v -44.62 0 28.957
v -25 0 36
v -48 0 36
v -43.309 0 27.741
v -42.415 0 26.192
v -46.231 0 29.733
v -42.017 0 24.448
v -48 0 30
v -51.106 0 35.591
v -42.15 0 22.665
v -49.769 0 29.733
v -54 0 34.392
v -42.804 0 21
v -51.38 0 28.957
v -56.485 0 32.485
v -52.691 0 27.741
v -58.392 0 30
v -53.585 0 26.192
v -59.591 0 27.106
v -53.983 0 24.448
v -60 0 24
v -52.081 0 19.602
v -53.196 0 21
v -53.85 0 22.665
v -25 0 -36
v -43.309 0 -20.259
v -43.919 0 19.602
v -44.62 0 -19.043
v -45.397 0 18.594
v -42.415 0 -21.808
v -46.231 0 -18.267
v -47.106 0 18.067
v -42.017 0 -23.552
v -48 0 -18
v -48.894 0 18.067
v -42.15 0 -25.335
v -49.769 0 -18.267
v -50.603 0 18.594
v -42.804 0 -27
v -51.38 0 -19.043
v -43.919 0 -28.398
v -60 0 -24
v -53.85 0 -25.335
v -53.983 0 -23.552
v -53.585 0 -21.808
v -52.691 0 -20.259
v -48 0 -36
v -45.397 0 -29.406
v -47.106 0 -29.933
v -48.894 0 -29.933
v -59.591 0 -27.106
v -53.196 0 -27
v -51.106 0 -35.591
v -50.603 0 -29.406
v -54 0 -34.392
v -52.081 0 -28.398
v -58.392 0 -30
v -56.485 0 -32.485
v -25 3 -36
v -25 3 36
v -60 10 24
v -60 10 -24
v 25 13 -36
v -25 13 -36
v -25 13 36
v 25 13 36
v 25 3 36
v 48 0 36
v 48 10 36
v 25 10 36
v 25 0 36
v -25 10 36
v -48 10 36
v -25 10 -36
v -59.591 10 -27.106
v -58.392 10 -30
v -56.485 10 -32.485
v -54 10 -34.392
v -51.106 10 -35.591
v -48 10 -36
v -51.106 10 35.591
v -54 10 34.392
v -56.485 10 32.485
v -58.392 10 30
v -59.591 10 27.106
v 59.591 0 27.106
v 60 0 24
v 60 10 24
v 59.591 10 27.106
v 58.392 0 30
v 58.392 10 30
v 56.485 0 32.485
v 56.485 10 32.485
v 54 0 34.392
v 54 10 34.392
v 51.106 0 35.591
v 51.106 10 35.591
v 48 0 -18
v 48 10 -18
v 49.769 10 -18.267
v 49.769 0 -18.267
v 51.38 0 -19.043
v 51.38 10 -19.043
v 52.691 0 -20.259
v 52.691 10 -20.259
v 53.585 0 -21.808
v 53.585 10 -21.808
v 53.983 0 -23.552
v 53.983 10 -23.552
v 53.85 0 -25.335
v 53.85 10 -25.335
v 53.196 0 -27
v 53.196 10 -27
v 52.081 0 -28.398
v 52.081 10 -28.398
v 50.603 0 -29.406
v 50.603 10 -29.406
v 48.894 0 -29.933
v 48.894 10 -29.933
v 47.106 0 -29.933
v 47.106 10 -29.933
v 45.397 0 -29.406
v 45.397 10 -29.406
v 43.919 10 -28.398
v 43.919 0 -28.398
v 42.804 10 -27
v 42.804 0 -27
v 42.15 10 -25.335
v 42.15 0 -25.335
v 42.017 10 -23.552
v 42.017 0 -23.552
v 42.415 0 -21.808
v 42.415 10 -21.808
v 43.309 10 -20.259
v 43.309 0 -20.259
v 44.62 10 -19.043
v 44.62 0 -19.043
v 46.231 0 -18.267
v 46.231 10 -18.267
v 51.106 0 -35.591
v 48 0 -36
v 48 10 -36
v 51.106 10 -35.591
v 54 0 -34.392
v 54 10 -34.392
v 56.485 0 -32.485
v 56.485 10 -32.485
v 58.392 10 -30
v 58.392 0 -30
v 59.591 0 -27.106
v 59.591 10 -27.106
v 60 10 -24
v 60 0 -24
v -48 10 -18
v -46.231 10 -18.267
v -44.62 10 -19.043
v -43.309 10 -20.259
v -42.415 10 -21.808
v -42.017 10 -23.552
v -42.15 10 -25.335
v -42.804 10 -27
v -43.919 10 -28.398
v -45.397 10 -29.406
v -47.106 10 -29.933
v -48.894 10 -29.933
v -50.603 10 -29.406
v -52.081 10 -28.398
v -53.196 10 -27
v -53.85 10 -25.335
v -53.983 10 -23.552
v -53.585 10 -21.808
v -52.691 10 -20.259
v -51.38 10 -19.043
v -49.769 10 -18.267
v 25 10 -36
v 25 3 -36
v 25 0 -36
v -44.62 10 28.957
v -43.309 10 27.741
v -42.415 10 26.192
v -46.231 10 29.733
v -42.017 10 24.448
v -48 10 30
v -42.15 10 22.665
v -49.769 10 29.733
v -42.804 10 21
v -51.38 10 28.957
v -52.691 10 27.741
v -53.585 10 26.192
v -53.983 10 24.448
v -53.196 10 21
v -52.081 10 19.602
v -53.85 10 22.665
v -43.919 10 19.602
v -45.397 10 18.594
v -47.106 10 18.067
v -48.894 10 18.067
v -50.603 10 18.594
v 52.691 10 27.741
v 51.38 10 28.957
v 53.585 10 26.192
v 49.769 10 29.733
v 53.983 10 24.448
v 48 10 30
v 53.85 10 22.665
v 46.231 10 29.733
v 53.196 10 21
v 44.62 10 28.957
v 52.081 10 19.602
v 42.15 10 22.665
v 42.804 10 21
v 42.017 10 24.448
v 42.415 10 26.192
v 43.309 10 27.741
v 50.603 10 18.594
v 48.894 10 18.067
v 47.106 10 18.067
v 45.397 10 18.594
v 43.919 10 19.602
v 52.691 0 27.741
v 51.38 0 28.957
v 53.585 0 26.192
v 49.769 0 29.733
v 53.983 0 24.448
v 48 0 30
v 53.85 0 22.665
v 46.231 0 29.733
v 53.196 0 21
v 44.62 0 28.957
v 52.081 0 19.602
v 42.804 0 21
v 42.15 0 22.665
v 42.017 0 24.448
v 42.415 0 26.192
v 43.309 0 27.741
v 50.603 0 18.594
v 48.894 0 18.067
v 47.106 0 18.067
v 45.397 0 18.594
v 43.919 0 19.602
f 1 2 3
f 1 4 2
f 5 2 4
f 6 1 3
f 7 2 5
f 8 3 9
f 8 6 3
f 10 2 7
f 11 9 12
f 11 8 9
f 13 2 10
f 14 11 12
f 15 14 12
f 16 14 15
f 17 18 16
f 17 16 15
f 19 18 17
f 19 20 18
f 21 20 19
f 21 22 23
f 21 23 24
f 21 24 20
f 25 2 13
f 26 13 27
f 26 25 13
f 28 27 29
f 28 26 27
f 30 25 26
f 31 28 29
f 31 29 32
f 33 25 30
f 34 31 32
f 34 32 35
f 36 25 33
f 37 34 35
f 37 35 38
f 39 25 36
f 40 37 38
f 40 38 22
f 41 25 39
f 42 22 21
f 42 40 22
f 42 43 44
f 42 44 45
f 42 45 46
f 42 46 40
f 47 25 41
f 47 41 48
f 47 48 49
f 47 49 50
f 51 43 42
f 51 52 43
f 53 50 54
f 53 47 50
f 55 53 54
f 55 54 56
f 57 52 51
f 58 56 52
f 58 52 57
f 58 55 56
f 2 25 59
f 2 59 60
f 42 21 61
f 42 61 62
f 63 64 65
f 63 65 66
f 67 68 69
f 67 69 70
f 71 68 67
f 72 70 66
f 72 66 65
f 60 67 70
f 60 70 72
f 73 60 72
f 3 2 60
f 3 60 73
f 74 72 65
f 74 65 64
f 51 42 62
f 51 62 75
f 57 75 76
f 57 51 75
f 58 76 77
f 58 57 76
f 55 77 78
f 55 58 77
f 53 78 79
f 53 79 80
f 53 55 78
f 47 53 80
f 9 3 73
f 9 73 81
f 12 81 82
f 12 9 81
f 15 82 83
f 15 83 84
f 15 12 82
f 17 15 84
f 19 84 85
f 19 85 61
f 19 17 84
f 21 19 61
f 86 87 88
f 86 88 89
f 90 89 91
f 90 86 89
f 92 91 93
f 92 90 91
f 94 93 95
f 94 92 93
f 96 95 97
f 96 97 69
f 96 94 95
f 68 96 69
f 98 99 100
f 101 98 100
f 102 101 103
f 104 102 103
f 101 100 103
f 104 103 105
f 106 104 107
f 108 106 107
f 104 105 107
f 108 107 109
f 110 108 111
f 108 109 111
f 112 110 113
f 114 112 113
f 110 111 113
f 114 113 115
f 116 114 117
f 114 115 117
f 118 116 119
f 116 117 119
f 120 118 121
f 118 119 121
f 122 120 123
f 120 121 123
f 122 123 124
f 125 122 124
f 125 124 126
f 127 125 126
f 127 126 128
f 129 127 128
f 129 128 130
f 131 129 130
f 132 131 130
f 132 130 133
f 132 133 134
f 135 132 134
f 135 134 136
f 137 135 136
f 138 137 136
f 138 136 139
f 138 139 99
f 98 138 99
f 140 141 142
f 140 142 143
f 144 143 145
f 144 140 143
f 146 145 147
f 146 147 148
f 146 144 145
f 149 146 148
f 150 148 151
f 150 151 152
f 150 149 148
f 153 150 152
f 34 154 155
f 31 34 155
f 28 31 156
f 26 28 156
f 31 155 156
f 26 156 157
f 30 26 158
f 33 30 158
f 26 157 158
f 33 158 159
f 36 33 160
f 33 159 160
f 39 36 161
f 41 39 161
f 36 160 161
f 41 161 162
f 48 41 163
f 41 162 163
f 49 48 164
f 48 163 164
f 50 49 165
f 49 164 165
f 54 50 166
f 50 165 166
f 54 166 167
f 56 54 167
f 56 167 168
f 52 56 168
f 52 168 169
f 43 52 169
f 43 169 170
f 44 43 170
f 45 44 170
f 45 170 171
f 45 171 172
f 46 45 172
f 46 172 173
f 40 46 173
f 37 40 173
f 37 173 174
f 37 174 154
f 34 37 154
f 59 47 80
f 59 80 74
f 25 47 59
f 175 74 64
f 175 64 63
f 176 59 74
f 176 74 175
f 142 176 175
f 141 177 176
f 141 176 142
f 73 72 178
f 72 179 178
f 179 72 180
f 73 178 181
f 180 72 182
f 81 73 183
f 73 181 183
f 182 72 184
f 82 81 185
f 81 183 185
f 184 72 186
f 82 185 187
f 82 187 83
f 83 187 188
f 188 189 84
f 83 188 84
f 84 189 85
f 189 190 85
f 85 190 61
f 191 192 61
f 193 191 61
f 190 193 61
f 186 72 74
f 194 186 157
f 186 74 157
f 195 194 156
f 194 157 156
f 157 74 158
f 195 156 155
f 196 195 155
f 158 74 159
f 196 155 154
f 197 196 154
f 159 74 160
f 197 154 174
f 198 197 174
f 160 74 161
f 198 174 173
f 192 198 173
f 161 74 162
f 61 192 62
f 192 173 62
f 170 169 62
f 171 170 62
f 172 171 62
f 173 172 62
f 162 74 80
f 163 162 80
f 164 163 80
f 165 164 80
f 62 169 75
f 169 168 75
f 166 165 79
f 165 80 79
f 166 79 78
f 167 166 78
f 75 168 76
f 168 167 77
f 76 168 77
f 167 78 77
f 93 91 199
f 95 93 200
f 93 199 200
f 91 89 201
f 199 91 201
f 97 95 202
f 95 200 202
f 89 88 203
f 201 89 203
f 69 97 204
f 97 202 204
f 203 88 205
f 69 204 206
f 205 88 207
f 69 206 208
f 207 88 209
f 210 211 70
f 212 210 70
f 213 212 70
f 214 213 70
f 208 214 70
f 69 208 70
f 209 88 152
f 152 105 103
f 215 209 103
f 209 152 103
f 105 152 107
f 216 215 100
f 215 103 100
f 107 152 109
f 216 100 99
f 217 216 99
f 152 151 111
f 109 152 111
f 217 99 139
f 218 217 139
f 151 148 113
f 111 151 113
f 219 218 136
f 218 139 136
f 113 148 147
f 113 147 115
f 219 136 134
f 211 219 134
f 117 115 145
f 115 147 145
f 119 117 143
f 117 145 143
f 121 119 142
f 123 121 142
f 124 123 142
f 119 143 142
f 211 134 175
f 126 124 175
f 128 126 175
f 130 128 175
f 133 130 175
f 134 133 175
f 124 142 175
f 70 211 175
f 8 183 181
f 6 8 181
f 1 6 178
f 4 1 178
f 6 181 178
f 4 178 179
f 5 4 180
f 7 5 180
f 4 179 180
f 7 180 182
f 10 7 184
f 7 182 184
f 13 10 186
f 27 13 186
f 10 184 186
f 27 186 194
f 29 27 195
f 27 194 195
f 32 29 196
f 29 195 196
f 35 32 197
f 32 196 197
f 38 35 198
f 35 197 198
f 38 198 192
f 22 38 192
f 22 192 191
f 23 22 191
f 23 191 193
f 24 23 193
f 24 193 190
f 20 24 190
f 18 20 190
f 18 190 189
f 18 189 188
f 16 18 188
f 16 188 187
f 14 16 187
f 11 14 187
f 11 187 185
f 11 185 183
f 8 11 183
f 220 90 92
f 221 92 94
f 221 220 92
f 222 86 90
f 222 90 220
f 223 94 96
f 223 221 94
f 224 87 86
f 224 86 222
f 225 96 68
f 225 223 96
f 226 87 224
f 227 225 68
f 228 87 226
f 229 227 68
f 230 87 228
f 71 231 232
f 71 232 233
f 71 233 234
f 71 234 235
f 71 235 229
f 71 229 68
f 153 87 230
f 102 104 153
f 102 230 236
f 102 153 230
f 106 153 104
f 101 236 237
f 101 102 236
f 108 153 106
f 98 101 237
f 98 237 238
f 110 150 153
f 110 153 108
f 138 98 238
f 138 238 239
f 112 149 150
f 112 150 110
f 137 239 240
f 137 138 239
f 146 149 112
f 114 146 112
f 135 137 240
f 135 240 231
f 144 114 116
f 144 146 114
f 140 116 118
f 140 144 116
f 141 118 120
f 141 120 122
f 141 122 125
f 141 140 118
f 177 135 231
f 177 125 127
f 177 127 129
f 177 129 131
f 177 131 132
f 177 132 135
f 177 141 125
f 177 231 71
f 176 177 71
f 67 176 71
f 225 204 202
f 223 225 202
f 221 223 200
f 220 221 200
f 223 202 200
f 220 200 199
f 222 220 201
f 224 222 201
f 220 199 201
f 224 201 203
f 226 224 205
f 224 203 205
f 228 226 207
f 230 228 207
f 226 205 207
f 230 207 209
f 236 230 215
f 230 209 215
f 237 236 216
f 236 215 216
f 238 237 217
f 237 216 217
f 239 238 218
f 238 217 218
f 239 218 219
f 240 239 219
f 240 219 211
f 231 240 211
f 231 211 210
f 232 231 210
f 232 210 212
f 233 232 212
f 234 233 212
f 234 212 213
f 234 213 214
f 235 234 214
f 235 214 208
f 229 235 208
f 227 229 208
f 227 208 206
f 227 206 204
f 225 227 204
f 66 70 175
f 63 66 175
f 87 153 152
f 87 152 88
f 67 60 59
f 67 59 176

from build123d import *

# Parameters (mm, degrees)
BOSS_EXTRUDE1_DEPTH = 10
SKETCH2_W           = 50
SKETCH2_H           = 72
BOSS_EXTRUDE2_DEPTH = 3
SKETCH3_W           = 50
SKETCH3_H           = 72
CUT_EXTRUDE1_DEPTH  = 3
SKETCH4_R           = 6
CUT_EXTRUDE3_DEPTH  = 49


with BuildPart() as part:
    # Sketch1 → Boss-Extrude1 (new body)
    with BuildSketch(Plane(origin=(0, 0, 0), x_dir=(1, 0, 0), z_dir=(0, 1, 0))):
        with BuildLine():
            Line((-48, 36), (48, 36))
            ThreePointArc((48, 36), (56.485281374, 32.485281374), (60, 24))
            Line((60, 24), (60, -24))
            ThreePointArc((60, -24), (56.485281374, -32.485281374), (48, -36))
            Line((48, -36), (-48, -36))
            ThreePointArc((-48, -36), (-56.485281374, -32.485281374), (-60, -24))
            Line((-60, -24), (-60, 24))
            ThreePointArc((-60, 24), (-56.485281374, 32.485281374), (-48, 36))
        make_face()
    extrude(amount=BOSS_EXTRUDE1_DEPTH)

    # Sketch2 → Boss-Extrude2 (add)
    with BuildSketch(Plane(origin=(0, 10, 0), x_dir=(1, 0, 0), z_dir=(0, 1, 0))):
        Rectangle(SKETCH2_W, SKETCH2_H)
    extrude(amount=BOSS_EXTRUDE2_DEPTH)

    # Sketch3 → Cut-Extrude1 (cut)
    with BuildSketch(Plane.XZ):
        Rectangle(SKETCH3_W, SKETCH3_H)
    extrude(amount=-CUT_EXTRUDE1_DEPTH, mode=Mode.SUBTRACT)

    # Sketch4 → Cut-Extrude3 (cut)
    with BuildSketch(Plane(origin=(0, 10, 0), x_dir=(1, 0, 0), z_dir=(0, 1, 0))):
        with Locations(Location((48, 24, 0), (0, 0, 270))):
            Circle(SKETCH4_R)
        with Locations(Location((48, -24, 0), (0, 0, 270))):
            Circle(SKETCH4_R)
        with Locations(Location((-48, -24, 0), (0, 0, 270))):
            Circle(SKETCH4_R)
        with Locations(Location((-48, 24, 0), (0, 0, 270))):
            Circle(SKETCH4_R)
    extrude(amount=-CUT_EXTRUDE3_DEPTH, mode=Mode.SUBTRACT)


solid = part.part
